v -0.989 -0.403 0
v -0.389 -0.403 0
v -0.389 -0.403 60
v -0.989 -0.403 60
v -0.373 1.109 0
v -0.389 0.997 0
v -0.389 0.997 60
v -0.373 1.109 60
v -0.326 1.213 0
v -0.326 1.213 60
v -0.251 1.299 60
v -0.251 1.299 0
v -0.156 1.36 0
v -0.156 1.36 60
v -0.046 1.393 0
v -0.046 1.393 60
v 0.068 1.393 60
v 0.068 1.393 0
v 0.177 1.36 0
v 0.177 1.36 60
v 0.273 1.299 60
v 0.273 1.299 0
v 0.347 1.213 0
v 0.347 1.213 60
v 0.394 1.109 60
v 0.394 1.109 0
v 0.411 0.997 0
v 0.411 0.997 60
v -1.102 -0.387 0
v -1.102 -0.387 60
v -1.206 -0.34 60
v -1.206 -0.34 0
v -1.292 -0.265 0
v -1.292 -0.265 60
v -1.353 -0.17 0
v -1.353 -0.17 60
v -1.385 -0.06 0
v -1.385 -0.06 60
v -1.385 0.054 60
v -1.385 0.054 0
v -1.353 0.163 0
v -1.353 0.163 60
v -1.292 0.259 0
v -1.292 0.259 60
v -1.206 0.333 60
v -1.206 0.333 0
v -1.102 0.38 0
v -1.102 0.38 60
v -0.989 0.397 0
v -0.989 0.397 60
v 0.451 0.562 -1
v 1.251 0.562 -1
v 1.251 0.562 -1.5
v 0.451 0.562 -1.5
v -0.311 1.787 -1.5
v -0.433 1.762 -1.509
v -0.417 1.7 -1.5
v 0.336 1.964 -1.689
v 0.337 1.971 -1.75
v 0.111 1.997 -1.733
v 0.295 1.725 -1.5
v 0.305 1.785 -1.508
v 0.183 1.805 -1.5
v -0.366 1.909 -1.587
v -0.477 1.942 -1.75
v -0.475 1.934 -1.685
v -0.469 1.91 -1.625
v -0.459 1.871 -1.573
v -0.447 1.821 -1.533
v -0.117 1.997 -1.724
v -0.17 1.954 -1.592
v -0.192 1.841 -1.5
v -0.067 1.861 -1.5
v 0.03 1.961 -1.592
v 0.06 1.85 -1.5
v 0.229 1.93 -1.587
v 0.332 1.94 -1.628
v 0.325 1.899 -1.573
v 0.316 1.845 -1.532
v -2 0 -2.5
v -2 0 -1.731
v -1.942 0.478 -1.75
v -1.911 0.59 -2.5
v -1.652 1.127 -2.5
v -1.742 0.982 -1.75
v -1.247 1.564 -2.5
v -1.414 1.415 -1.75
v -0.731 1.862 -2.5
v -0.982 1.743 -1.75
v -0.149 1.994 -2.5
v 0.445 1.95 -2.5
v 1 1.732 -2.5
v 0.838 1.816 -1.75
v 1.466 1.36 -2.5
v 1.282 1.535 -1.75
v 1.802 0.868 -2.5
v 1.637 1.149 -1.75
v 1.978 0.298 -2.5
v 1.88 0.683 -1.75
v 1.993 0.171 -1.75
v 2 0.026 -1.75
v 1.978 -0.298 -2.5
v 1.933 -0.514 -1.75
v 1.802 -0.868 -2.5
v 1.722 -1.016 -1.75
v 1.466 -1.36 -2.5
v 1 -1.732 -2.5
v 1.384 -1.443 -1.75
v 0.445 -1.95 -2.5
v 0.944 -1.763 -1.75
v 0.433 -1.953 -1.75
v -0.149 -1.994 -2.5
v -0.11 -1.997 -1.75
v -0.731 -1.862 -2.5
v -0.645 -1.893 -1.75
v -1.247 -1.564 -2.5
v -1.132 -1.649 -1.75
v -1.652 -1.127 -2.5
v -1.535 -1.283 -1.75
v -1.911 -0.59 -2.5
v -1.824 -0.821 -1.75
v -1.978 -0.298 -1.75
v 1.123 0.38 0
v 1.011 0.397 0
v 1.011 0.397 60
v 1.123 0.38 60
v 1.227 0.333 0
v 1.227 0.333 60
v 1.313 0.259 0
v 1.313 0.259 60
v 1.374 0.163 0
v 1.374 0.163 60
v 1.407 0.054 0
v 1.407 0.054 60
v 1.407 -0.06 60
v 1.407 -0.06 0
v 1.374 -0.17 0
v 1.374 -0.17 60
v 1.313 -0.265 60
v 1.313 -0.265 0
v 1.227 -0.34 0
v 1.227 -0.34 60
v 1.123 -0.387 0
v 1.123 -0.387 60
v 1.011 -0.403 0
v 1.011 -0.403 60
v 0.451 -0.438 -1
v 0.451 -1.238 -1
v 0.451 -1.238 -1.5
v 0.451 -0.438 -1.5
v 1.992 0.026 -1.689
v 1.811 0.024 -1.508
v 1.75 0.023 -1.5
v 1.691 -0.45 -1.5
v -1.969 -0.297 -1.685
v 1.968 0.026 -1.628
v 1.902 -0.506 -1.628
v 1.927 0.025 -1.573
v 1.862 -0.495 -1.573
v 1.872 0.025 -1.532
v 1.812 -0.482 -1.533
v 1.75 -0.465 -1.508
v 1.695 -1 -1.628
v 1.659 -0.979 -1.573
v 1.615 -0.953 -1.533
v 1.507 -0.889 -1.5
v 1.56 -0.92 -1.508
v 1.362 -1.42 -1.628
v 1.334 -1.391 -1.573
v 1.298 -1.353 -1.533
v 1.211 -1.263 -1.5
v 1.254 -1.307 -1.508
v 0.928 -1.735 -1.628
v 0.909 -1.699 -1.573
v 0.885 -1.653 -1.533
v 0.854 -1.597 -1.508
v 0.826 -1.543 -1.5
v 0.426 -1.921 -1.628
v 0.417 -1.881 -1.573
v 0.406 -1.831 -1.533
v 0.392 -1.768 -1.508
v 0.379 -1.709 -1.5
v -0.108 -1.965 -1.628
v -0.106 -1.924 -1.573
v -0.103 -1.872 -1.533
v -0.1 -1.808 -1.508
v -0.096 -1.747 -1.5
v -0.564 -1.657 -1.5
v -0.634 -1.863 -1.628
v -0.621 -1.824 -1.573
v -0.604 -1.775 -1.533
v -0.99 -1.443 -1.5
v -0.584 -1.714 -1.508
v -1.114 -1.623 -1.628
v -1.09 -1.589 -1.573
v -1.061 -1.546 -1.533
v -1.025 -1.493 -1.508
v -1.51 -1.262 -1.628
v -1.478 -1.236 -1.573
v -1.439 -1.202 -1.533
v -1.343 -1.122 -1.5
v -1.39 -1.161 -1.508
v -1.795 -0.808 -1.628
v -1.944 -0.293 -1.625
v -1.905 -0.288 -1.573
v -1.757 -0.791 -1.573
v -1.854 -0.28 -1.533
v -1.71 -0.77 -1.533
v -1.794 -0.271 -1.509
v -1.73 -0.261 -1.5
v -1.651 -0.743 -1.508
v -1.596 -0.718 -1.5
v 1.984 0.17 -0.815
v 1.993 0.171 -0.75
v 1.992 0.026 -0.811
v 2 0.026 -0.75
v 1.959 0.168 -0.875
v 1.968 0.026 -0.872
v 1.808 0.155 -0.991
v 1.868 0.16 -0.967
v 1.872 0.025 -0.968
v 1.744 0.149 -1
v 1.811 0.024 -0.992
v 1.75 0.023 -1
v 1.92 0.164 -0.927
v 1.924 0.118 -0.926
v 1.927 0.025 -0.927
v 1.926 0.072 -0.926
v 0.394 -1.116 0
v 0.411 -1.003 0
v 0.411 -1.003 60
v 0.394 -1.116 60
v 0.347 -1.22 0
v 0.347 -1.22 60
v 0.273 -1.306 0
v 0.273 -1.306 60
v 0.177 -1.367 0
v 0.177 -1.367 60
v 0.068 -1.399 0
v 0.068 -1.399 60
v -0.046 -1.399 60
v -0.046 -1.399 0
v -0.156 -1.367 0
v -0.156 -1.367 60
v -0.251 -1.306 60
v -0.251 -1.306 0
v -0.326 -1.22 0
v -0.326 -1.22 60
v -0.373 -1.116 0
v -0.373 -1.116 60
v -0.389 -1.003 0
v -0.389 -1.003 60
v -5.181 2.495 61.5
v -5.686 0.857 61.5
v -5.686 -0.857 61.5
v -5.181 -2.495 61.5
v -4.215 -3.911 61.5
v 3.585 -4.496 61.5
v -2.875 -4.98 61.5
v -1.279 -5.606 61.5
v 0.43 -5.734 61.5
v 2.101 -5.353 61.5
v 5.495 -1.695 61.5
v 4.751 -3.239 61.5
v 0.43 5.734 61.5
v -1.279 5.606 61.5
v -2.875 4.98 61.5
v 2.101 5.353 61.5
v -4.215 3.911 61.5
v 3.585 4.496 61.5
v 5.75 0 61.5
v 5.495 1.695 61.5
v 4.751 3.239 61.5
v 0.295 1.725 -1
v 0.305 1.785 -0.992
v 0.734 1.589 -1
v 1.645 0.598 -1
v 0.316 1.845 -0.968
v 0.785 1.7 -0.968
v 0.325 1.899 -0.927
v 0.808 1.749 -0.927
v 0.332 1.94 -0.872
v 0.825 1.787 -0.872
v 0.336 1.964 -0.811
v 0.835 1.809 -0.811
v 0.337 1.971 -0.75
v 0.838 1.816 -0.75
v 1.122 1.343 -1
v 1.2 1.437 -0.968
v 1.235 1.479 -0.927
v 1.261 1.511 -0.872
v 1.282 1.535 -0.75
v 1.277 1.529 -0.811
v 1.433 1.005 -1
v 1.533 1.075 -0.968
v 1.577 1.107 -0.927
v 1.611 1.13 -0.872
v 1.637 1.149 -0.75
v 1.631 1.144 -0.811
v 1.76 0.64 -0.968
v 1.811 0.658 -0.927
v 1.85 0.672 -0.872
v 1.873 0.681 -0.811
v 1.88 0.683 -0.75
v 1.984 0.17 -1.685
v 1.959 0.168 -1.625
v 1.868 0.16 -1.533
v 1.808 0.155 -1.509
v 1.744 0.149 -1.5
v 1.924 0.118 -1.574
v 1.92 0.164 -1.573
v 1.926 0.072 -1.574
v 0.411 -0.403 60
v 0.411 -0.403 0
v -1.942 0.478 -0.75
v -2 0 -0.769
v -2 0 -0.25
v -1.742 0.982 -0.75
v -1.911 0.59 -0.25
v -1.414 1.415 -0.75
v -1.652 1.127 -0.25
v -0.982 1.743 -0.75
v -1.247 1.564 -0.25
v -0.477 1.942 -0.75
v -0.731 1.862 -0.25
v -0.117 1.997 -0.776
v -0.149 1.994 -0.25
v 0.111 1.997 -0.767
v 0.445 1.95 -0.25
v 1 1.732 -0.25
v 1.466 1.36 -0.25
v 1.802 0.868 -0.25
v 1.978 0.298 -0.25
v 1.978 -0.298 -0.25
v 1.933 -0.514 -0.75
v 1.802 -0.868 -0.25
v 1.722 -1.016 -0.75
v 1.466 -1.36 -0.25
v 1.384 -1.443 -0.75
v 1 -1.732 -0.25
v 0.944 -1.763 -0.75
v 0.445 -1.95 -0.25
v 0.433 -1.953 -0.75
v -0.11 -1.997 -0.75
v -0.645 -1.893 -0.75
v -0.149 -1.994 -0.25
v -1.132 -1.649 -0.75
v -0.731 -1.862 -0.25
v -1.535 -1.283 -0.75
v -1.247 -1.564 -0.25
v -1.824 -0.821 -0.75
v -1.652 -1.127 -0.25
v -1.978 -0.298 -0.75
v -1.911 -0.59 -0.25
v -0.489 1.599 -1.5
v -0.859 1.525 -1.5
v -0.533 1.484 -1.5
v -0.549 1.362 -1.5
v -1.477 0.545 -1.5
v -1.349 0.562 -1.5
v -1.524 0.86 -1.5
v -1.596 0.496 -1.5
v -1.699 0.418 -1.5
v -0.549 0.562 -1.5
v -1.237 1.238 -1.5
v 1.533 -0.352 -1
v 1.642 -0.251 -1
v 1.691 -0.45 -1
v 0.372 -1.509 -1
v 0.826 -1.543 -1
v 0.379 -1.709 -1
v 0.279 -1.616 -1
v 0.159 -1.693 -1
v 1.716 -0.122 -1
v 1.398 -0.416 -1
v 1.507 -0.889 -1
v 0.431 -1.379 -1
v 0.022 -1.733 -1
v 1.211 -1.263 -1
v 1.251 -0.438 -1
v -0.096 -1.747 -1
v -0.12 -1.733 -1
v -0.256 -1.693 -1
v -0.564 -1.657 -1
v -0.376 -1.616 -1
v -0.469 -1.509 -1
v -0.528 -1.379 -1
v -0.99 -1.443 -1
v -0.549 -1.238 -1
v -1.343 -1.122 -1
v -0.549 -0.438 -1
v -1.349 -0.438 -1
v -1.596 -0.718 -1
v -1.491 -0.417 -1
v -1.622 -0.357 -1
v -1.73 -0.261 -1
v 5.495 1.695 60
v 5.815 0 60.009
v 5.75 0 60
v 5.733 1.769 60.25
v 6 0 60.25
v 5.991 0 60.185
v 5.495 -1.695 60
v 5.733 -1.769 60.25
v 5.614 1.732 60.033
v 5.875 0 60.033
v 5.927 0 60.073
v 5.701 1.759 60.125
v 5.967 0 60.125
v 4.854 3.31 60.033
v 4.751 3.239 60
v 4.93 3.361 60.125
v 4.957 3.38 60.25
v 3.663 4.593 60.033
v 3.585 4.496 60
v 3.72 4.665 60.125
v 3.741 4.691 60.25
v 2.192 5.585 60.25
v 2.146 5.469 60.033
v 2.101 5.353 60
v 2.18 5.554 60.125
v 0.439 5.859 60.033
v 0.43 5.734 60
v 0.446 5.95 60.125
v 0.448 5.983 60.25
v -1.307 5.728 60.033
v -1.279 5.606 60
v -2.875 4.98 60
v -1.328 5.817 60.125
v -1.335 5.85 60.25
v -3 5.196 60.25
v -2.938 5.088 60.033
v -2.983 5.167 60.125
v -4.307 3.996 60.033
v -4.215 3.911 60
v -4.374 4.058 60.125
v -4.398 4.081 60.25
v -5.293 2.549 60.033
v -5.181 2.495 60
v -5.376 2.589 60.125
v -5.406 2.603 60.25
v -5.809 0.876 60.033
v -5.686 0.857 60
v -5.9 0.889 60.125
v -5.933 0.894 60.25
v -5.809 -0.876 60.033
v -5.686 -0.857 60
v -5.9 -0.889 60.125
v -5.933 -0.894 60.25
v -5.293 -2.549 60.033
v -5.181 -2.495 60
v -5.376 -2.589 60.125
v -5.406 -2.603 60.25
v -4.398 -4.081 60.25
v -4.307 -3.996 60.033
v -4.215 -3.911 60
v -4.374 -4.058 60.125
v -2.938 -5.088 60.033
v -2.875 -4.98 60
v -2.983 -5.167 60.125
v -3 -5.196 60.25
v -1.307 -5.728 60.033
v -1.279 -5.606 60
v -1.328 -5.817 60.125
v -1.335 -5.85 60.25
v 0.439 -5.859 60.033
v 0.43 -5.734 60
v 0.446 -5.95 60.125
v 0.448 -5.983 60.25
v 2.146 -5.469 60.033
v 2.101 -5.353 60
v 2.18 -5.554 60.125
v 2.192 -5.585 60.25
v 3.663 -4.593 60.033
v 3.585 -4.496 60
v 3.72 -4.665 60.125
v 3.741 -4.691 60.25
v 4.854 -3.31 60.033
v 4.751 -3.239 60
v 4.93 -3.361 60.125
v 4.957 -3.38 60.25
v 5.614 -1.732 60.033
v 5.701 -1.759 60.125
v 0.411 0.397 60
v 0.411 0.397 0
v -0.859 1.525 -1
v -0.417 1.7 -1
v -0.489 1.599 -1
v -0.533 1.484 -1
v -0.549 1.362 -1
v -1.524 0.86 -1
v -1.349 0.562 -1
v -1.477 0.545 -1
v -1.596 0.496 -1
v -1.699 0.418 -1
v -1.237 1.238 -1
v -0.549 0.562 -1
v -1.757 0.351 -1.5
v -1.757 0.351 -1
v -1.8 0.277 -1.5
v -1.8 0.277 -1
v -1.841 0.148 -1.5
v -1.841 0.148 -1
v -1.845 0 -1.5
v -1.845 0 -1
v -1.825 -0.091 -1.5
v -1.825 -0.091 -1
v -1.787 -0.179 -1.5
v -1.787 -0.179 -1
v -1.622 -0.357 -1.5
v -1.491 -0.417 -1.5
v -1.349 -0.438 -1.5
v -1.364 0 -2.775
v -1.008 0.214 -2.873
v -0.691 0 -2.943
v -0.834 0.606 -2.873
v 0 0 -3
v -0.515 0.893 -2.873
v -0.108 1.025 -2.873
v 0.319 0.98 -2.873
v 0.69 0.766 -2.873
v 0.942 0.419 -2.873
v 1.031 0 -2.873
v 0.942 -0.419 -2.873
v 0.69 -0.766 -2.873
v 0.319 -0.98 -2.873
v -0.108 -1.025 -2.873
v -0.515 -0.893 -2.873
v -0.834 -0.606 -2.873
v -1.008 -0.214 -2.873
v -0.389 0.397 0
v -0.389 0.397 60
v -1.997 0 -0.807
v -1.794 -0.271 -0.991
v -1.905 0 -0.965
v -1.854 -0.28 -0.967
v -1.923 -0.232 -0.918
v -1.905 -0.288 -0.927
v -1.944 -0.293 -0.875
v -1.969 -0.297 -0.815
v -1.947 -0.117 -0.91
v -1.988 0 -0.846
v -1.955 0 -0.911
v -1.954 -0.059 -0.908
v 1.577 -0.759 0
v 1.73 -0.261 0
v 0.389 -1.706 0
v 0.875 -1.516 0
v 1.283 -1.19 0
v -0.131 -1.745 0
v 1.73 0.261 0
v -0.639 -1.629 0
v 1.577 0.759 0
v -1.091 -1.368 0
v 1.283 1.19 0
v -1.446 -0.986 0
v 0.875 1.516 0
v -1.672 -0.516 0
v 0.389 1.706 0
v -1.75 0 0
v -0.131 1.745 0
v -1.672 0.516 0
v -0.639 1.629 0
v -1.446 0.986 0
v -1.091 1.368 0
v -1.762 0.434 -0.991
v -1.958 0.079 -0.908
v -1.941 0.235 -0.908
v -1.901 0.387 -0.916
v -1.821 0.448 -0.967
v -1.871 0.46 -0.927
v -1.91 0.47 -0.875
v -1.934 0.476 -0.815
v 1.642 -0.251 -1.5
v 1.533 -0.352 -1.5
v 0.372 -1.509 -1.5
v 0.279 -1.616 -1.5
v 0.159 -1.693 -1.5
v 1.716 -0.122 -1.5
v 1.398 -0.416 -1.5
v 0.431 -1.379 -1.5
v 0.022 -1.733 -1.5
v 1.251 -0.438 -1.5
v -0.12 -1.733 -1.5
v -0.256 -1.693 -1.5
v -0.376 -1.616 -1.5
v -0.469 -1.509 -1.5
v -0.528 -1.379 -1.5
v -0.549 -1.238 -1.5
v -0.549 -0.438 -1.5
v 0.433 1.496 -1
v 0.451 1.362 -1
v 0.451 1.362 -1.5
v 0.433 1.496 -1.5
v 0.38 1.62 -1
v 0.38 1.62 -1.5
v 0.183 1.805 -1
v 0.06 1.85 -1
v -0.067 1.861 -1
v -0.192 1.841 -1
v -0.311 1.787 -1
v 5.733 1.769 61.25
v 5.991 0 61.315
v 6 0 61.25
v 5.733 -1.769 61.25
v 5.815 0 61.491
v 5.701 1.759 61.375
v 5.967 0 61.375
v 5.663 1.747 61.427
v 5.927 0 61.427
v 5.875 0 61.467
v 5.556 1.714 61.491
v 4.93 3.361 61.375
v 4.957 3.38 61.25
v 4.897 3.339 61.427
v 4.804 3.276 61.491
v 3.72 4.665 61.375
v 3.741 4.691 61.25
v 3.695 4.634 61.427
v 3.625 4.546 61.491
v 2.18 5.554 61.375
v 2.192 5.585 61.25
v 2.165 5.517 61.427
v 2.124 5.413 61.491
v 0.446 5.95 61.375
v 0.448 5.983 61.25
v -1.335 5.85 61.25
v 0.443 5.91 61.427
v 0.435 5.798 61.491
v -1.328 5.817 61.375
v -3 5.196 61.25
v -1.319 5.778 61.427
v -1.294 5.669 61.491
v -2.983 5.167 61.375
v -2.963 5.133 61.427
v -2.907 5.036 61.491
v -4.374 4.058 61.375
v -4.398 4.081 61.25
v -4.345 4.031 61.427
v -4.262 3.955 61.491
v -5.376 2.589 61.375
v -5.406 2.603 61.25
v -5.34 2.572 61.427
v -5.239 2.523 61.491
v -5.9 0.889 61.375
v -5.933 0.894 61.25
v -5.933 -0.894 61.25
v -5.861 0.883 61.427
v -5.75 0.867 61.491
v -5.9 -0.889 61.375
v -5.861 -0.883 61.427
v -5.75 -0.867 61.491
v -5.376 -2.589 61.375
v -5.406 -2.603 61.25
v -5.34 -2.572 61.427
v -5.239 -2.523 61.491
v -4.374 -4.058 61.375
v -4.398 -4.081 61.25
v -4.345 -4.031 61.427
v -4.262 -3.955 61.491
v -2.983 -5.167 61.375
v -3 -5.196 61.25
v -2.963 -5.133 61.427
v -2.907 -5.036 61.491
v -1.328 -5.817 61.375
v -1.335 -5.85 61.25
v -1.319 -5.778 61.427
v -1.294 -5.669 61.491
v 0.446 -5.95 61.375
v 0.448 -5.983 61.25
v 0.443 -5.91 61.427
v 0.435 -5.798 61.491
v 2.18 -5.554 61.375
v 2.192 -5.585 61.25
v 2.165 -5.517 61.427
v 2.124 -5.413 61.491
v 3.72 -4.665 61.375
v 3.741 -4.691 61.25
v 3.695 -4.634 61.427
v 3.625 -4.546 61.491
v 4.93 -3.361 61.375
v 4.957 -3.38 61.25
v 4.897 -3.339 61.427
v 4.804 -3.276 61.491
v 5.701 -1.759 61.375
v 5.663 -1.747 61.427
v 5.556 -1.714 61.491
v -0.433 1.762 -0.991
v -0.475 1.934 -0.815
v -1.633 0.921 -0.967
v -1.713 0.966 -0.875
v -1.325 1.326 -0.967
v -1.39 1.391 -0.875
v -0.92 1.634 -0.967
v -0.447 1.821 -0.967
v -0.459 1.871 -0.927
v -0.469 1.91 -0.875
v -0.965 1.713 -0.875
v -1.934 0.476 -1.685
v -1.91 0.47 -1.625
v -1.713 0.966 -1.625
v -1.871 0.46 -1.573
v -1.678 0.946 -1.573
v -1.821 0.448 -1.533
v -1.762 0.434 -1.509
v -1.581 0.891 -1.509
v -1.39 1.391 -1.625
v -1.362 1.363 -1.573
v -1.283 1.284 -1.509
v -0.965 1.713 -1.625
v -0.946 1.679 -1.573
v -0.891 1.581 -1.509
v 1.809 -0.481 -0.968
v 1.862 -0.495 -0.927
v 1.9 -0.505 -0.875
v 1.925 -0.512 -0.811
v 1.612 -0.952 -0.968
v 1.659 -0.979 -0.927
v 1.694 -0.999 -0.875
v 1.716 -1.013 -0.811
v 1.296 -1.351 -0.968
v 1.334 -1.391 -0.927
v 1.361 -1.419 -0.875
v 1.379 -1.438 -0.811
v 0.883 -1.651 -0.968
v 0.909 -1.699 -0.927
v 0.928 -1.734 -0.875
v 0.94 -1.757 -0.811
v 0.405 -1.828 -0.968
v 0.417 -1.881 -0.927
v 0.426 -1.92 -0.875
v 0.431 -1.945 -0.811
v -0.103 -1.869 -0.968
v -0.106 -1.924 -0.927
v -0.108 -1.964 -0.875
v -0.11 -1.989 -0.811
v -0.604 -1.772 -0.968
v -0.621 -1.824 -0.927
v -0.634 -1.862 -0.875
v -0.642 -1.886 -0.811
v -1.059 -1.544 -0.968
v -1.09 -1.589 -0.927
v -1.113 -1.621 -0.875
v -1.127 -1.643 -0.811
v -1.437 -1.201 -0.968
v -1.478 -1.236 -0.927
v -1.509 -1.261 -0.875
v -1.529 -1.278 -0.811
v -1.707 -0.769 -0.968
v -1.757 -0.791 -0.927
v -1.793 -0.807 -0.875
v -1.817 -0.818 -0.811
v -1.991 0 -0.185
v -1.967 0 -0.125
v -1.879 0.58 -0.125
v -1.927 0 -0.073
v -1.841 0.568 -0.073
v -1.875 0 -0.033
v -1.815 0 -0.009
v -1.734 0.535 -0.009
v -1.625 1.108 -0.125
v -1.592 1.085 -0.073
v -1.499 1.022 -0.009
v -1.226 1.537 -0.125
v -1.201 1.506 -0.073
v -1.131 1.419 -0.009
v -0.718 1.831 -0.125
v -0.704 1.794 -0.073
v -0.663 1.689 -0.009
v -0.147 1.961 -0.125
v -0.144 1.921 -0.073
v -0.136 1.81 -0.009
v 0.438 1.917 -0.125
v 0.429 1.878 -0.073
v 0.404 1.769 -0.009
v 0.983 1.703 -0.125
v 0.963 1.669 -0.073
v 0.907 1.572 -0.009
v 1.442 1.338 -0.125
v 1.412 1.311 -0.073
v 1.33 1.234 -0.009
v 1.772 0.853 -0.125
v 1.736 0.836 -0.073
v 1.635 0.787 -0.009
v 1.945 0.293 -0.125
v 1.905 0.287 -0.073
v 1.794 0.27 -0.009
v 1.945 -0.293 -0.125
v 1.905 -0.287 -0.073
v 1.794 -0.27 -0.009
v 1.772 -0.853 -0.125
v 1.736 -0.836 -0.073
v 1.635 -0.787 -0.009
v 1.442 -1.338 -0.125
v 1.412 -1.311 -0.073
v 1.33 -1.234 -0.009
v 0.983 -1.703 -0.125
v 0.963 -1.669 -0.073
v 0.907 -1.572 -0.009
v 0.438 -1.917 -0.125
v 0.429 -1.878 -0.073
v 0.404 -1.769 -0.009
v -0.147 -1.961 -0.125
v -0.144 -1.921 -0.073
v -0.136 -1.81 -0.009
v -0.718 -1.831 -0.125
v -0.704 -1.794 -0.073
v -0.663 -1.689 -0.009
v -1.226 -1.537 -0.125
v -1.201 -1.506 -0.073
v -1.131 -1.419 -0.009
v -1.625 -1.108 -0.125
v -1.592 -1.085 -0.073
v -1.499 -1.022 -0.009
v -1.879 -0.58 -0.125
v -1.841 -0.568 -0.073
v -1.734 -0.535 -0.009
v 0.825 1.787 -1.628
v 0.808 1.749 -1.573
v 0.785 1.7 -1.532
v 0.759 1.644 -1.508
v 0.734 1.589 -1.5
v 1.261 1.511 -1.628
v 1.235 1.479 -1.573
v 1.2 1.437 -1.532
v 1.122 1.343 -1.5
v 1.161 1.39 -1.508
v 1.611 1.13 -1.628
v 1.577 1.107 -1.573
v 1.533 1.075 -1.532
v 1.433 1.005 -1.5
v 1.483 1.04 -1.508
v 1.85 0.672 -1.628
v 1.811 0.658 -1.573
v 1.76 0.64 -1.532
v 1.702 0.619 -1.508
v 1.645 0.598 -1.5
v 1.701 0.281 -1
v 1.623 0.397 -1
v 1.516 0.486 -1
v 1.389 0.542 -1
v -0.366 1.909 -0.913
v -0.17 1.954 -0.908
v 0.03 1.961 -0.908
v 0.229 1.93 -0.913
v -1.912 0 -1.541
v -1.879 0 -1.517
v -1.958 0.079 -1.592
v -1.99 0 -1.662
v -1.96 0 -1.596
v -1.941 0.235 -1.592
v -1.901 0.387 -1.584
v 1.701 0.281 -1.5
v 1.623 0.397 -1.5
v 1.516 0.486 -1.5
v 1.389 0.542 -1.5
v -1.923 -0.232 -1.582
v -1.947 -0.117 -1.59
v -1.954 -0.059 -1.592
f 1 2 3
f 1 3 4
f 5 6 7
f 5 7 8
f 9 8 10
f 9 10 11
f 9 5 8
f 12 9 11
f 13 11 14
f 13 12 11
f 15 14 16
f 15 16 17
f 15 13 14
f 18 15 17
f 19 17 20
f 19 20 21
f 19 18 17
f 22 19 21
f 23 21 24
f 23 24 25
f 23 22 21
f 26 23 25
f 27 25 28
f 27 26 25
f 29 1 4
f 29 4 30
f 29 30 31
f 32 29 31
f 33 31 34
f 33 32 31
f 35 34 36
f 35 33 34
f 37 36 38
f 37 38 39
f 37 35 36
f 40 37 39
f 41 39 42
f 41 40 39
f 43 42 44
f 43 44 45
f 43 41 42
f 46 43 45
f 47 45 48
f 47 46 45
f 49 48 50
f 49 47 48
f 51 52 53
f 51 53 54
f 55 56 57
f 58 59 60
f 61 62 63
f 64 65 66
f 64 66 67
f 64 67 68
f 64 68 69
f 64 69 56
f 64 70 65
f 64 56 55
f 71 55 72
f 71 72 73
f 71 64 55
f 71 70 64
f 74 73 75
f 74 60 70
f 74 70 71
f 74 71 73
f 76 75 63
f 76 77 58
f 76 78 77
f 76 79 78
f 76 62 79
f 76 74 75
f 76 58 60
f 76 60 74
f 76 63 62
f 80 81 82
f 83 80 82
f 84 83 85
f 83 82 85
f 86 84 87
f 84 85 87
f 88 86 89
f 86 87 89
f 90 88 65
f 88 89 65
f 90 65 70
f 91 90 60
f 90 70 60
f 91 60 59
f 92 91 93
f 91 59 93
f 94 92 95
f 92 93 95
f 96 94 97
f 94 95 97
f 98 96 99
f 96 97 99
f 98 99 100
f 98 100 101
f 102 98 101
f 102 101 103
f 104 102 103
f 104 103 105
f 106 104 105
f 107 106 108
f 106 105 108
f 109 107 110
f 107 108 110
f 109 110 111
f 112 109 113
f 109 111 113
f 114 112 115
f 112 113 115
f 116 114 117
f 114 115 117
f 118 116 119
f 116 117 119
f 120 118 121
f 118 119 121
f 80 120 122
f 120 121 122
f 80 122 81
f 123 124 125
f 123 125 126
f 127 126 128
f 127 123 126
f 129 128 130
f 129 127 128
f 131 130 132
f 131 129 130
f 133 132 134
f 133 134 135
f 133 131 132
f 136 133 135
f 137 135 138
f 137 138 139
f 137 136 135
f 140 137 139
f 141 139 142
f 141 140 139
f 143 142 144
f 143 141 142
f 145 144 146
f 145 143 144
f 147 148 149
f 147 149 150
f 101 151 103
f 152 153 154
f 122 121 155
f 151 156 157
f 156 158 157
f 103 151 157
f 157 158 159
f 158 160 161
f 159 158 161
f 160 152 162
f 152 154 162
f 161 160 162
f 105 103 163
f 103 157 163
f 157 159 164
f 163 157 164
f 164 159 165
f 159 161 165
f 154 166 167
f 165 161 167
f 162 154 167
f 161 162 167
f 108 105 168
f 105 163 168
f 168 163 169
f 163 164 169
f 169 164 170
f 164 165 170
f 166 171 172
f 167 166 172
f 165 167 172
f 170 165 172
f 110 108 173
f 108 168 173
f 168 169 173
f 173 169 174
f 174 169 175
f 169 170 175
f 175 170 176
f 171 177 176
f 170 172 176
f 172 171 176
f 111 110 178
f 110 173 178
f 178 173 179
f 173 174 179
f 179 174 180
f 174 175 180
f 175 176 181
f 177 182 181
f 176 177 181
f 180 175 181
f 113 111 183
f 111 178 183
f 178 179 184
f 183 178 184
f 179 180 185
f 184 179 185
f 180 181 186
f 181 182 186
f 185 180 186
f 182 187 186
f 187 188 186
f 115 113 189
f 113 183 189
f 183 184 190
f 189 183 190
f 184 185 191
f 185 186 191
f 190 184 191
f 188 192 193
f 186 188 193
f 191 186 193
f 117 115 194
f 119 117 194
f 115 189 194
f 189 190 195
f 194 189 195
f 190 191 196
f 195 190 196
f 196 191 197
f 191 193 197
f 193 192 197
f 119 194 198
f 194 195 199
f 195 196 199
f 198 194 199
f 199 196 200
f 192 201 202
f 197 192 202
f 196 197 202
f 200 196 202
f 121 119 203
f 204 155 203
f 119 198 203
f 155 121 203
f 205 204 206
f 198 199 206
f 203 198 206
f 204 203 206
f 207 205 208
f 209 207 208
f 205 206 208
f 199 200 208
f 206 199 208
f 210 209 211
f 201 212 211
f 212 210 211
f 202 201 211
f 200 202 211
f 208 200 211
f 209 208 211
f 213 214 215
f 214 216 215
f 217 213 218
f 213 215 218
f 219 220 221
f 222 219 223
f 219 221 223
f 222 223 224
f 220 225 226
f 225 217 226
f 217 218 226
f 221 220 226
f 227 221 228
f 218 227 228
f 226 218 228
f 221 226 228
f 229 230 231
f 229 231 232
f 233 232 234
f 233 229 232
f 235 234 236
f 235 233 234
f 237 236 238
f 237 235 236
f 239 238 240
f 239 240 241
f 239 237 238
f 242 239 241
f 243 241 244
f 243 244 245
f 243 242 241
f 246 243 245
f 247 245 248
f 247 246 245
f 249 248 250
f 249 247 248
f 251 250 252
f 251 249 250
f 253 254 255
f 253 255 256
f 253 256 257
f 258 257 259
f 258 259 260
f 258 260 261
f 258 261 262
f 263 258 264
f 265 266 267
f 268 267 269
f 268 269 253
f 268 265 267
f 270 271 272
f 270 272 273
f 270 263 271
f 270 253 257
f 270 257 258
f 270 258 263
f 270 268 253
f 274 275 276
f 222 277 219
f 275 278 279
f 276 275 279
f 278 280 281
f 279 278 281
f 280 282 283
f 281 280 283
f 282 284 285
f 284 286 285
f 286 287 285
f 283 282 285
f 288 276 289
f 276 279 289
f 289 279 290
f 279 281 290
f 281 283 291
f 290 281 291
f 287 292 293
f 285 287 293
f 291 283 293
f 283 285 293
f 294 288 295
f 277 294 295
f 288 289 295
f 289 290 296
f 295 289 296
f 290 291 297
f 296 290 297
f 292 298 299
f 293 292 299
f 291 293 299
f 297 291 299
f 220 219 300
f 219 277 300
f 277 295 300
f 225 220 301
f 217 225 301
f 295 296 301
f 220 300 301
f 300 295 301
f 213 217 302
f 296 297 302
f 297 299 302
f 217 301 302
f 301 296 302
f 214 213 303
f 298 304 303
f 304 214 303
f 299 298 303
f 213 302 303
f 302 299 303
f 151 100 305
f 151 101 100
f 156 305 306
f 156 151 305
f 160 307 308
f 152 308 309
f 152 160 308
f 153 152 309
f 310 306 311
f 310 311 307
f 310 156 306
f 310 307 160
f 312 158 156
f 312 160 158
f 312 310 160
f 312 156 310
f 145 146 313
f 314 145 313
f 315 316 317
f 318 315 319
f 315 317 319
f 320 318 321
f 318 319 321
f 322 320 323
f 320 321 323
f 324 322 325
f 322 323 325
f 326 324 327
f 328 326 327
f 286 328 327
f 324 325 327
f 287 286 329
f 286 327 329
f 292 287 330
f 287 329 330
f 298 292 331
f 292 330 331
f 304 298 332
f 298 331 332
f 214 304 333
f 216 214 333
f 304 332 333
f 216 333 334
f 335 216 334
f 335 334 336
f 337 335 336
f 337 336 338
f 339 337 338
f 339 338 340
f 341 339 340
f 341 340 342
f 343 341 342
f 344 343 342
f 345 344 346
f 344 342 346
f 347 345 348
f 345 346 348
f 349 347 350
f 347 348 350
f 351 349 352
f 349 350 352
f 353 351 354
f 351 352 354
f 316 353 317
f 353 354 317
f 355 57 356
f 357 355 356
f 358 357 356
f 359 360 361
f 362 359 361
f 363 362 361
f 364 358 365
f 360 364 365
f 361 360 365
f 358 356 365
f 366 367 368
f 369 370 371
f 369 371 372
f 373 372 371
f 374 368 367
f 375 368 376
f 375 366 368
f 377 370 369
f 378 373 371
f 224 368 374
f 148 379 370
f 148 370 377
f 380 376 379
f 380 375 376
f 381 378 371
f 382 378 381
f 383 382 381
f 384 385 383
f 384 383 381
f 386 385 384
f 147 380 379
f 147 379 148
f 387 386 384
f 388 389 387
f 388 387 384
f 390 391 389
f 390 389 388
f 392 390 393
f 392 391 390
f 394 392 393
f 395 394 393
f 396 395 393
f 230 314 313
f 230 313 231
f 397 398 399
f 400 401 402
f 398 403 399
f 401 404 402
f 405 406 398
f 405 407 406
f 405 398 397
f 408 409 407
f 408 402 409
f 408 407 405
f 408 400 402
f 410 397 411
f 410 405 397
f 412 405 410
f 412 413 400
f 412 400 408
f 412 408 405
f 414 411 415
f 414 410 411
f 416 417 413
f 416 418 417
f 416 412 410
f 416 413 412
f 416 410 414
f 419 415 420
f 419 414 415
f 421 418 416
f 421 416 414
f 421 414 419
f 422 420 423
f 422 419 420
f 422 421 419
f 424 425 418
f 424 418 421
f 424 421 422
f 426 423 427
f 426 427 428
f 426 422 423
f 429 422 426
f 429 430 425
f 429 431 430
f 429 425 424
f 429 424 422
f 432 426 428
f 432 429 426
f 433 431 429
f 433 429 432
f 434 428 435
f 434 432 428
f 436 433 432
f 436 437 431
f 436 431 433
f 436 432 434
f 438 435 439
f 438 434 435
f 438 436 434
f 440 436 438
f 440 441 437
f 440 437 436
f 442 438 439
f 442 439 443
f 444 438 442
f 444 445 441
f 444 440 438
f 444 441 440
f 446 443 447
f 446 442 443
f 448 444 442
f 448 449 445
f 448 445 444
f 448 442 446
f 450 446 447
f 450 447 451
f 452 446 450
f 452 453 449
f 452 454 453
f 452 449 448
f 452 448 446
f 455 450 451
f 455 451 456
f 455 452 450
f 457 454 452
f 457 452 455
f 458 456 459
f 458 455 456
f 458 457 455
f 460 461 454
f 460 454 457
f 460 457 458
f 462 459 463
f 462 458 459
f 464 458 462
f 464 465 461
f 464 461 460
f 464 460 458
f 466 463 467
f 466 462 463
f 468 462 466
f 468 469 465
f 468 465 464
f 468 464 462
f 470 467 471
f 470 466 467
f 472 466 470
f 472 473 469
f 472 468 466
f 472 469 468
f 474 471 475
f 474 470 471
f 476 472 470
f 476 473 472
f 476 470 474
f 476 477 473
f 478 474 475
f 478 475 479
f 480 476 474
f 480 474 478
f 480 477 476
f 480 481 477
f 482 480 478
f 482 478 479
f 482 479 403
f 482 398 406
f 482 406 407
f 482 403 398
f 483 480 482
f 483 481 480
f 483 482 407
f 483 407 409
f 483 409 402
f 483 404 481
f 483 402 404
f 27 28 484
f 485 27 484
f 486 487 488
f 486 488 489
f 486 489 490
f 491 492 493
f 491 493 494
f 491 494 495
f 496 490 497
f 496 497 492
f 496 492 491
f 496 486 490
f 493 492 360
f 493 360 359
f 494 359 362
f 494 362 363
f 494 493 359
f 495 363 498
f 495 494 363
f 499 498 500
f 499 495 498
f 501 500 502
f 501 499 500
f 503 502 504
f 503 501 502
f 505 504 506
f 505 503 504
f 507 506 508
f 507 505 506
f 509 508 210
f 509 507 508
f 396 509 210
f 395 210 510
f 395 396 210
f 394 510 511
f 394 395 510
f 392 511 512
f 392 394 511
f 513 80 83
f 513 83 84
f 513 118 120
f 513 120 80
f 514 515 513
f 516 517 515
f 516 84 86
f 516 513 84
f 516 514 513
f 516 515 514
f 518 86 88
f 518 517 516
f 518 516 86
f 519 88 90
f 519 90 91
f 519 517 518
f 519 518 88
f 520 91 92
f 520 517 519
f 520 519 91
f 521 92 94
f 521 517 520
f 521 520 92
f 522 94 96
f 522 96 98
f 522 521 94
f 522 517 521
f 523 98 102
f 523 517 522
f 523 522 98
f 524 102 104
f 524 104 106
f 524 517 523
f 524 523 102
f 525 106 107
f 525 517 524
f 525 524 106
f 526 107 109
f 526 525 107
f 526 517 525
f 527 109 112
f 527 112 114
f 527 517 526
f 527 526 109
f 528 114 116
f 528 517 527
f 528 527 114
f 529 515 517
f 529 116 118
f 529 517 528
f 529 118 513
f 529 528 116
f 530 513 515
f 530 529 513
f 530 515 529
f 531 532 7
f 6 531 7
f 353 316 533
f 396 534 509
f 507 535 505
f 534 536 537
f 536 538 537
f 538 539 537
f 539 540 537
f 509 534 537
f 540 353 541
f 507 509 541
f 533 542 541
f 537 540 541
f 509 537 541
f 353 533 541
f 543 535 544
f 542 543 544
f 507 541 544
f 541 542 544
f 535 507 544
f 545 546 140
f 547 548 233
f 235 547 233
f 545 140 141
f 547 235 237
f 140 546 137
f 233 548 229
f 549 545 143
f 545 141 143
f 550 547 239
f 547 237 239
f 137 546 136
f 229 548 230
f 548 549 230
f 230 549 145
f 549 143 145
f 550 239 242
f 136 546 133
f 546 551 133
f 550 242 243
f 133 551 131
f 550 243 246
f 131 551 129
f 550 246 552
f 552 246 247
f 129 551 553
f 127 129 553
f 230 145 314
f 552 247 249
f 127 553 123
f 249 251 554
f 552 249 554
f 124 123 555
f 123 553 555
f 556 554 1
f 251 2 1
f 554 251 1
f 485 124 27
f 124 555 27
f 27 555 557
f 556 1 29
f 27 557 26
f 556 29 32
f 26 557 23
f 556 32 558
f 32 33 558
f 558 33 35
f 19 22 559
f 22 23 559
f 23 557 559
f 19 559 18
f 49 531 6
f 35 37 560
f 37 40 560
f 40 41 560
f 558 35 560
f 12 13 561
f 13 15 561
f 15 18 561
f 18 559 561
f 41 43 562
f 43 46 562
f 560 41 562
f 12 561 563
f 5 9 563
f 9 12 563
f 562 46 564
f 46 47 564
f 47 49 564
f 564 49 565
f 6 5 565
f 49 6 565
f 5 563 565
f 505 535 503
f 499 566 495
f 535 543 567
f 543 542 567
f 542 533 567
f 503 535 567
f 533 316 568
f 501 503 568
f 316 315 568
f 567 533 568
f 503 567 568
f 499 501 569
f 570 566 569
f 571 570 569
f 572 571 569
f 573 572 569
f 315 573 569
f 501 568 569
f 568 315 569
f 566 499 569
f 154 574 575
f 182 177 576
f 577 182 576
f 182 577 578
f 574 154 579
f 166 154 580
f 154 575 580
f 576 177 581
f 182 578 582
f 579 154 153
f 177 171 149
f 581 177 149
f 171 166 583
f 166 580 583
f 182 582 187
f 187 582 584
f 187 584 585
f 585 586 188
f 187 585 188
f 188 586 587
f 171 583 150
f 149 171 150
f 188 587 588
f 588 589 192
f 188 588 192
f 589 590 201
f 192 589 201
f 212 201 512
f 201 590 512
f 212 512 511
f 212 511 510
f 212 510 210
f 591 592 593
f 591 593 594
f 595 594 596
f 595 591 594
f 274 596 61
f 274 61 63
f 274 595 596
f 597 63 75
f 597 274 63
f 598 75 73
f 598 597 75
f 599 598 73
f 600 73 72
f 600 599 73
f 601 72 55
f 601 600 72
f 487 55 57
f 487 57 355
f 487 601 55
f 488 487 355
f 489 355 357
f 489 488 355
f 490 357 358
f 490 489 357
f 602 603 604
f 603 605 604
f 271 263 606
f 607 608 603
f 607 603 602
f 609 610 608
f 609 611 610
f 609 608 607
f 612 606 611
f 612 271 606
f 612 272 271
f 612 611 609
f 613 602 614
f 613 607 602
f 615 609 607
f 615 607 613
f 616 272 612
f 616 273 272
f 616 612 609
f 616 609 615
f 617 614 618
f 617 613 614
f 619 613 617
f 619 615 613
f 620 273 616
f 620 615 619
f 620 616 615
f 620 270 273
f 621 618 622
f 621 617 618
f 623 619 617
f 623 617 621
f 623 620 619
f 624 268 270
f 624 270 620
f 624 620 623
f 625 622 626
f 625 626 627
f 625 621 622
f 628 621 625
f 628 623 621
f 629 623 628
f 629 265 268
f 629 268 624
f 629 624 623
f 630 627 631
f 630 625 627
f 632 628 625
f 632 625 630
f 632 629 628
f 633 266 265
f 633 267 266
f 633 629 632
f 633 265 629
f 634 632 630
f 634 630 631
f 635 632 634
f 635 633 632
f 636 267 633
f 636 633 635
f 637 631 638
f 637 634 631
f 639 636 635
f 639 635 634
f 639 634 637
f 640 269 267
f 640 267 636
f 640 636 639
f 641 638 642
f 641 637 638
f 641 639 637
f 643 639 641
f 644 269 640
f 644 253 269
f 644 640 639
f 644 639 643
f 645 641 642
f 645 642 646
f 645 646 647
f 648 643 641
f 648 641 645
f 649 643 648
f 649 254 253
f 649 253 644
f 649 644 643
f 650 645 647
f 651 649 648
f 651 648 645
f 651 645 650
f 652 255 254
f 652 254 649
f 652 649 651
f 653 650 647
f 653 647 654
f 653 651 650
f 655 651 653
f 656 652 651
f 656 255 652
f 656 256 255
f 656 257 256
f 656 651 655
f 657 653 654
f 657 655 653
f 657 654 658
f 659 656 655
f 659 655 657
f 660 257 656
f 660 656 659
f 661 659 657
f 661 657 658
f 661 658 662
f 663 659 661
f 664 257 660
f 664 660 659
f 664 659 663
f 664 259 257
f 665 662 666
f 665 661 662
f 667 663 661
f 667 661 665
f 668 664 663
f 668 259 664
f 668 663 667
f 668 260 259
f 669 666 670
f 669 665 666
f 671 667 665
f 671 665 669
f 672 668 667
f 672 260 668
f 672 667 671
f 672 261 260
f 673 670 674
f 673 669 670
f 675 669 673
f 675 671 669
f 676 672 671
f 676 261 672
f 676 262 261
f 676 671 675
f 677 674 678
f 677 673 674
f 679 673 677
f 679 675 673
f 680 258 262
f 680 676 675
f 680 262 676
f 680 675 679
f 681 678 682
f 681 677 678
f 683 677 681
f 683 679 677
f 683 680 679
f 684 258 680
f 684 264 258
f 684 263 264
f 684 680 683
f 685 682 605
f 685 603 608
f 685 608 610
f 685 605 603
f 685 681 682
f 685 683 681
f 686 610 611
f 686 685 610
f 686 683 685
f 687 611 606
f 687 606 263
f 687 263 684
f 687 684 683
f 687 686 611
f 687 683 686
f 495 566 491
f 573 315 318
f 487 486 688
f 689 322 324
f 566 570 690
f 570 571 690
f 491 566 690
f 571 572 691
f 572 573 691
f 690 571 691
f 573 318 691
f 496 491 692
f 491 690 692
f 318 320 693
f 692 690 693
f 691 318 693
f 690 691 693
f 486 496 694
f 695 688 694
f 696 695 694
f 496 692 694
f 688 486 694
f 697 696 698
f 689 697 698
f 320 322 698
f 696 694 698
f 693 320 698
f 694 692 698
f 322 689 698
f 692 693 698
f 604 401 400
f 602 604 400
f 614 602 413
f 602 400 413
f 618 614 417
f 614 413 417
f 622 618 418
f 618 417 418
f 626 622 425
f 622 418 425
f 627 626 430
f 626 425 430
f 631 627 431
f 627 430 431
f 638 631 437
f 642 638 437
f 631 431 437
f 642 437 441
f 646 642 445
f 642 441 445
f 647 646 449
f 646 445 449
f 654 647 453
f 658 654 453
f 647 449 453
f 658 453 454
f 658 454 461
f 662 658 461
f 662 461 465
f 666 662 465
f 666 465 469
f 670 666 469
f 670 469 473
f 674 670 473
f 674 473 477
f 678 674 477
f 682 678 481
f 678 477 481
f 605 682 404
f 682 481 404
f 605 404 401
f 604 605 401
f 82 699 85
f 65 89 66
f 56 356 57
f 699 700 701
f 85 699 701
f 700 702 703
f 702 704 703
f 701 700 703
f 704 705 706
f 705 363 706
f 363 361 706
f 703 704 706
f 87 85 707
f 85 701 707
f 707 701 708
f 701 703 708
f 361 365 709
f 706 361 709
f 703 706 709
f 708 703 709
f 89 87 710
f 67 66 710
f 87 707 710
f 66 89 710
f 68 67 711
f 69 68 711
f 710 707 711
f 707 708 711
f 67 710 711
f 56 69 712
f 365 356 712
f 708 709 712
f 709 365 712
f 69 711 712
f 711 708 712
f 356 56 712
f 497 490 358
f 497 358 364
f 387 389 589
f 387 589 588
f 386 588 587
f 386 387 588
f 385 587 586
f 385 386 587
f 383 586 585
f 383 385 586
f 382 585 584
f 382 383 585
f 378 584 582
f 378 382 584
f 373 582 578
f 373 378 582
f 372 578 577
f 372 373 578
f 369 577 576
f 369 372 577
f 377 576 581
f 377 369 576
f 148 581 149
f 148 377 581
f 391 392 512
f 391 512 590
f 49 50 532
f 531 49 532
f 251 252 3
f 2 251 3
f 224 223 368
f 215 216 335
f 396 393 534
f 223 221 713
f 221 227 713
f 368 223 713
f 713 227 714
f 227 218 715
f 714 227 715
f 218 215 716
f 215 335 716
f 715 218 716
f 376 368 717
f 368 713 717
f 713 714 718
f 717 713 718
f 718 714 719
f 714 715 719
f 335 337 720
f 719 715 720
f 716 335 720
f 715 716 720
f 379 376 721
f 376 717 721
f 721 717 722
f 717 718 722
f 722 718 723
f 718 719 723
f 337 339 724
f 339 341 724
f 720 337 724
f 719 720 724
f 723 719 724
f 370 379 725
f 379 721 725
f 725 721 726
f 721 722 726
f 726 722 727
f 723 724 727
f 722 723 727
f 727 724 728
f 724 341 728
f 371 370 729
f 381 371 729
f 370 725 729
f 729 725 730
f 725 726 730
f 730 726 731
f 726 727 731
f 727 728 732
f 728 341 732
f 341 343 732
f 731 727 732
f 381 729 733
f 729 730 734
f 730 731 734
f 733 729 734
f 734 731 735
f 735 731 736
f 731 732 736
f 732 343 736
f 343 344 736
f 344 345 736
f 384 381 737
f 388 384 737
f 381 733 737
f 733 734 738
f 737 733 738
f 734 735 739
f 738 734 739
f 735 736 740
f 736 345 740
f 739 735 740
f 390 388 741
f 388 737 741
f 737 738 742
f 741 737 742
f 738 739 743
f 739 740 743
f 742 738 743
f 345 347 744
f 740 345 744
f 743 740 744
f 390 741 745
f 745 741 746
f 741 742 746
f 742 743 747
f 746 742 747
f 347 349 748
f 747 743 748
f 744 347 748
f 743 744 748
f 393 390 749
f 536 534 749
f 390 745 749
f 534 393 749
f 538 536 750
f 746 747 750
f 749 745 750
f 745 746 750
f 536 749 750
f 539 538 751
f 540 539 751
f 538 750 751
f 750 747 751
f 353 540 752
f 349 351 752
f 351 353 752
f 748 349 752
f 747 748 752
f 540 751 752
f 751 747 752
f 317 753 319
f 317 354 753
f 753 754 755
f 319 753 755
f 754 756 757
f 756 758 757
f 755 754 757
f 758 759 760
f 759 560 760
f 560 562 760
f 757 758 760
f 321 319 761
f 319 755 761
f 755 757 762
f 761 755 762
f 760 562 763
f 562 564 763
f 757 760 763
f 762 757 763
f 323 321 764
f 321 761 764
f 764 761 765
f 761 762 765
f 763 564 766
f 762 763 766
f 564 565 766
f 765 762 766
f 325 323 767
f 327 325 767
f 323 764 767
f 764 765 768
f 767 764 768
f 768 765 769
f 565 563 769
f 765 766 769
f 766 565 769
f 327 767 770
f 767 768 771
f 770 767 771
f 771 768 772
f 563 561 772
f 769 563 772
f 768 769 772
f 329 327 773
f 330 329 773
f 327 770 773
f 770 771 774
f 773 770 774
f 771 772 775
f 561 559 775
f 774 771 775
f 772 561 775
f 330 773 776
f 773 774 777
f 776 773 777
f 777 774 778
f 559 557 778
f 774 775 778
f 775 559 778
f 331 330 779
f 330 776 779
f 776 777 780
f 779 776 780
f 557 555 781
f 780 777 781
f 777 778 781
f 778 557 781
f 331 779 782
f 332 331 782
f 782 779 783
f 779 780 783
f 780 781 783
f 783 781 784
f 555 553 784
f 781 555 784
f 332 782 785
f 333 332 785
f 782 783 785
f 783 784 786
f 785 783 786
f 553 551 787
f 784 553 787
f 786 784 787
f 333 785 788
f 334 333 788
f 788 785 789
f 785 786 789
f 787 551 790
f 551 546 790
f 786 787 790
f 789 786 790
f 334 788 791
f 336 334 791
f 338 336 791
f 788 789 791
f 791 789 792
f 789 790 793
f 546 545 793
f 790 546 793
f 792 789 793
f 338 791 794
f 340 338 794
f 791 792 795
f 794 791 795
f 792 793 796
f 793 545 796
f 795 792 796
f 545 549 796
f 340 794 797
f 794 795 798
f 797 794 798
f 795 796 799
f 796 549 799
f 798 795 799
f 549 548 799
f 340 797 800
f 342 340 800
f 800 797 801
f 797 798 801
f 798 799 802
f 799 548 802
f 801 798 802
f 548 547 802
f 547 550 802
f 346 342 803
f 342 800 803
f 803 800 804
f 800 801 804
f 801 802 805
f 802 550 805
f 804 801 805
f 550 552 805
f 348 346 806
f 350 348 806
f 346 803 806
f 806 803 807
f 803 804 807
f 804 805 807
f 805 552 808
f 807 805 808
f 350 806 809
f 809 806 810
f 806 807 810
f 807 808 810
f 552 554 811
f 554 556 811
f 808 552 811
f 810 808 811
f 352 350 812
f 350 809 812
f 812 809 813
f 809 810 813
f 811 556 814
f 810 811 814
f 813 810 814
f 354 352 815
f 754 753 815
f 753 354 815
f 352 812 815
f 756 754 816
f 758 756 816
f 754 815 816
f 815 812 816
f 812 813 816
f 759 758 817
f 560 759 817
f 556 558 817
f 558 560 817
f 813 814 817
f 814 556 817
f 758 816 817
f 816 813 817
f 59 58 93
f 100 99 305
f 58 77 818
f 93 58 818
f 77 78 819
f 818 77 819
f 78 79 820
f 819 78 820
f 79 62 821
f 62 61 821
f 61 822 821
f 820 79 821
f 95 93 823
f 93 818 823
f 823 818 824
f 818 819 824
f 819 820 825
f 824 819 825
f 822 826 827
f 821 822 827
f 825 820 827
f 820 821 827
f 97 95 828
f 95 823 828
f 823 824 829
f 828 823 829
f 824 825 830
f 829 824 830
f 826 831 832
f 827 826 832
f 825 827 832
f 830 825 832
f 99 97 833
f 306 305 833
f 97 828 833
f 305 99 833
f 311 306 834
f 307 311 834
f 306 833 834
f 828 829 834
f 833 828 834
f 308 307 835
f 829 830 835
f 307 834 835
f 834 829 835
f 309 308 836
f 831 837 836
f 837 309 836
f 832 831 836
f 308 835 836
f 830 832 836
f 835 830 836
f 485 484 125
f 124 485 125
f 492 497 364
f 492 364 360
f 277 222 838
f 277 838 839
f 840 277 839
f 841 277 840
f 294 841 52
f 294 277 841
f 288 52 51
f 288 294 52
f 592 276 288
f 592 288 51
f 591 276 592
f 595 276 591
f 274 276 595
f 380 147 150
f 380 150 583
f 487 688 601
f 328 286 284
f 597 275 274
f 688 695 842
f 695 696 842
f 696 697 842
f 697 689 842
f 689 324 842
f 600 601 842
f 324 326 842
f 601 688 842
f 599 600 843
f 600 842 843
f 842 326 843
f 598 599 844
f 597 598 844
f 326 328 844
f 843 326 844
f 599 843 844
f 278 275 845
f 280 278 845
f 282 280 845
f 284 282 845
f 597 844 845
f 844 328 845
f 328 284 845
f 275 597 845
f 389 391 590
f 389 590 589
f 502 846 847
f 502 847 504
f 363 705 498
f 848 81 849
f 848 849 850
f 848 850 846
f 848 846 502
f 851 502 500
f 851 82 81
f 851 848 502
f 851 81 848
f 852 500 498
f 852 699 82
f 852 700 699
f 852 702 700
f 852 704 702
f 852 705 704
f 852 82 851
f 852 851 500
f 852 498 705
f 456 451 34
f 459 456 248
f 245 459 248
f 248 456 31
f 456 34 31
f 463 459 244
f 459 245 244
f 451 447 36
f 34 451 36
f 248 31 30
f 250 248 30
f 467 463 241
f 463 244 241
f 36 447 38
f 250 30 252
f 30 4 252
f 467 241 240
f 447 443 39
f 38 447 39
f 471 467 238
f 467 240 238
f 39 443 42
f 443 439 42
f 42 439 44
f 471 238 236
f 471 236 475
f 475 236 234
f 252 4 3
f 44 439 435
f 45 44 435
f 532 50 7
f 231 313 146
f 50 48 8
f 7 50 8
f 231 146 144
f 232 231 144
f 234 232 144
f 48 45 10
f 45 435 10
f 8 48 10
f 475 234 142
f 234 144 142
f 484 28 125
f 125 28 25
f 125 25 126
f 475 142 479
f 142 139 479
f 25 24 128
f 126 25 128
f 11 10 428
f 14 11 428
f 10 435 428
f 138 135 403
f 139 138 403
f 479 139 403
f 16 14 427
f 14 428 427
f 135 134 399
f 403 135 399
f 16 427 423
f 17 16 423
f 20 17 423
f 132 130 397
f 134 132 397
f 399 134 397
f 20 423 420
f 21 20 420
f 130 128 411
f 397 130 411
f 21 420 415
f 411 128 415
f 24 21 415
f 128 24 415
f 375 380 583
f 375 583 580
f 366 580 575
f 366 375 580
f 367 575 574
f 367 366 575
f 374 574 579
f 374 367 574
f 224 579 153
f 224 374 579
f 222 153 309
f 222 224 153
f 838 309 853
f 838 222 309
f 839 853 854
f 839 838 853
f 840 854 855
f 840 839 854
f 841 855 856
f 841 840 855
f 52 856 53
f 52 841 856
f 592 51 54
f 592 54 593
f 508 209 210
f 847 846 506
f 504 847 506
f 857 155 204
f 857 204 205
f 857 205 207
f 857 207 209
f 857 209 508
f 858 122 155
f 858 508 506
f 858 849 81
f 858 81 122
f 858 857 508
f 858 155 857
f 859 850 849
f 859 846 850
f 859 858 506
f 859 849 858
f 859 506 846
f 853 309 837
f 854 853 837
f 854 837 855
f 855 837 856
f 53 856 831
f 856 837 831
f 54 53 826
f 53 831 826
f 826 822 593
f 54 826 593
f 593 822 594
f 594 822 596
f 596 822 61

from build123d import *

# Parameters (mm, degrees)
BOSS_EXTRUDE1_DEPTH = 60
SKETCH4_R           = 6
BOSS_EXTRUDE2_DEPTH = 1.5
SKETCH5_R           = 2
BOSS_EXTRUDE3_DEPTH = 1
BOSS_EXTRUDE4_DEPTH = 0.5
SKETCH9_R           = 2
BOSS_EXTRUDE5_DEPTH = 1
DOME1_FACE_RADIUS   = 2
DOME1_HEIGHT        = 0.5
FILLET1_R           = 0.25


with BuildPart() as part:
    # Sketch3 → Boss-Extrude1 (new body)
    with BuildSketch(Plane.XY):
        with BuildLine():
            ThreePointArc((-0.989400555, -0.403387526), (-1.389400555, -0.003387526), (-0.989400555, 0.396612474))
            Line((-0.989400555, 0.396612474), (-0.389400555, 0.396612474))
            Line((-0.389400555, 0.396612474), (-0.389400555, 0.996612474))
            ThreePointArc((-0.389400555, 0.996612474), (0.010599445, 1.396612474), (0.410599445, 0.996612474))
            Line((0.410599445, 0.996612474), (0.410599445, 0.396612474))
            Line((0.410599445, 0.396612474), (1.010599445, 0.396612474))
            ThreePointArc((1.010599445, 0.396612474), (1.410599445, -0.003387526), (1.010599445, -0.403387526))
            Line((1.010599445, -0.403387526), (0.410599445, -0.403387526))
            Line((0.410599445, -0.403387526), (0.410599445, -1.003387526))
            ThreePointArc((0.410599445, -1.003387526), (0.010599445, -1.403387526), (-0.389400555, -1.003387526))
            Line((-0.389400555, -1.003387526), (-0.389400555, -0.403387526))
            Line((-0.389400555, -0.403387526), (-0.989400555, -0.403387526))
        make_face()
    extrude(amount=BOSS_EXTRUDE1_DEPTH)

    # Sketch4 → Boss-Extrude2 (add)
    with BuildSketch(Plane.XY.offset(60)):
        Circle(SKETCH4_R)
    extrude(amount=BOSS_EXTRUDE2_DEPTH)

    # Sketch5 → Boss-Extrude3 (add)
    with BuildSketch(Plane(origin=(0, 0, 0), x_dir=(-1, 0, 0), z_dir=(0, 0, -1))):
        Circle(SKETCH5_R)
    extrude(amount=BOSS_EXTRUDE3_DEPTH)

    # Sketch6 → Boss-Extrude4 (add)
    with BuildSketch(Plane(origin=(0, 0, -1), x_dir=(-1, 0, 0), z_dir=(0, 0, -1))):
        with BuildLine():
            Line((-0.451338334, 0.561736981), (-0.451338334, 1.361736981))
            ThreePointArc((-0.451338334, 1.361736981), (0.048661666, 1.861736981), (0.548661666, 1.361736981))
            Line((0.548661666, 1.361736981), (0.548661666, 0.561736981))
            Line((0.548661666, 0.561736981), (1.348661666, 0.561736981))
            ThreePointArc((1.348661666, 0.561736981), (1.848661666, 0.061736981), (1.348661666, -0.438263019))
            Line((1.348661666, -0.438263019), (0.548661666, -0.438263019))
            Line((0.548661666, -0.438263019), (0.548661666, -1.238263019))
            ThreePointArc((0.548661666, -1.238263019), (0.048661666, -1.738263019), (-0.451338334, -1.238263019))
            Line((-0.451338334, -1.238263019), (-0.451338334, -0.438263019))
            Line((-0.451338334, -0.438263019), (-1.251338334, -0.438263019))
            ThreePointArc((-1.251338334, -0.438263019), (-1.751338334, 0.061736981), (-1.251338334, 0.561736981))
            Line((-1.251338334, 0.561736981), (-0.451338334, 0.561736981))
        make_face()
    extrude(amount=BOSS_EXTRUDE4_DEPTH)

    # Sketch9 → Boss-Extrude5 (add)
    with BuildSketch(Plane(origin=(0, 0, -1.5), x_dir=(-1, 0, 0), z_dir=(0, 0, -1))):
        Circle(SKETCH9_R)
    extrude(amount=BOSS_EXTRUDE5_DEPTH)

    # Dome1: a dome of height H over a round flat face of radius A is a cap of a sphere of radius (A * A + H * H) / (2 * H)
    dome1_r = (DOME1_FACE_RADIUS * DOME1_FACE_RADIUS + DOME1_HEIGHT * DOME1_HEIGHT) / (2 * DOME1_HEIGHT)
    dome1_base = Plane((0, 0, -2.5), z_dir=(0, 0, -1))
    with Locations(dome1_base.offset(DOME1_HEIGHT - dome1_r)):
        dome1_ball = Sphere(dome1_r, mode=Mode.PRIVATE)
    add(split(dome1_ball, bisect_by=dome1_base, keep=Keep.TOP, mode=Mode.PRIVATE))

    # Fillet1
    fillet1_edges = [part.edges().sort_by_distance(p)[0] for p in [
        (-6, 0, 60),
        (-6, 0, 61.5),
        (2, 0, 0),
        (2, 0, -1),
        (2, 0, -1.5),
    ]]
    fillet(fillet1_edges, radius=FILLET1_R)


solid = part.part
